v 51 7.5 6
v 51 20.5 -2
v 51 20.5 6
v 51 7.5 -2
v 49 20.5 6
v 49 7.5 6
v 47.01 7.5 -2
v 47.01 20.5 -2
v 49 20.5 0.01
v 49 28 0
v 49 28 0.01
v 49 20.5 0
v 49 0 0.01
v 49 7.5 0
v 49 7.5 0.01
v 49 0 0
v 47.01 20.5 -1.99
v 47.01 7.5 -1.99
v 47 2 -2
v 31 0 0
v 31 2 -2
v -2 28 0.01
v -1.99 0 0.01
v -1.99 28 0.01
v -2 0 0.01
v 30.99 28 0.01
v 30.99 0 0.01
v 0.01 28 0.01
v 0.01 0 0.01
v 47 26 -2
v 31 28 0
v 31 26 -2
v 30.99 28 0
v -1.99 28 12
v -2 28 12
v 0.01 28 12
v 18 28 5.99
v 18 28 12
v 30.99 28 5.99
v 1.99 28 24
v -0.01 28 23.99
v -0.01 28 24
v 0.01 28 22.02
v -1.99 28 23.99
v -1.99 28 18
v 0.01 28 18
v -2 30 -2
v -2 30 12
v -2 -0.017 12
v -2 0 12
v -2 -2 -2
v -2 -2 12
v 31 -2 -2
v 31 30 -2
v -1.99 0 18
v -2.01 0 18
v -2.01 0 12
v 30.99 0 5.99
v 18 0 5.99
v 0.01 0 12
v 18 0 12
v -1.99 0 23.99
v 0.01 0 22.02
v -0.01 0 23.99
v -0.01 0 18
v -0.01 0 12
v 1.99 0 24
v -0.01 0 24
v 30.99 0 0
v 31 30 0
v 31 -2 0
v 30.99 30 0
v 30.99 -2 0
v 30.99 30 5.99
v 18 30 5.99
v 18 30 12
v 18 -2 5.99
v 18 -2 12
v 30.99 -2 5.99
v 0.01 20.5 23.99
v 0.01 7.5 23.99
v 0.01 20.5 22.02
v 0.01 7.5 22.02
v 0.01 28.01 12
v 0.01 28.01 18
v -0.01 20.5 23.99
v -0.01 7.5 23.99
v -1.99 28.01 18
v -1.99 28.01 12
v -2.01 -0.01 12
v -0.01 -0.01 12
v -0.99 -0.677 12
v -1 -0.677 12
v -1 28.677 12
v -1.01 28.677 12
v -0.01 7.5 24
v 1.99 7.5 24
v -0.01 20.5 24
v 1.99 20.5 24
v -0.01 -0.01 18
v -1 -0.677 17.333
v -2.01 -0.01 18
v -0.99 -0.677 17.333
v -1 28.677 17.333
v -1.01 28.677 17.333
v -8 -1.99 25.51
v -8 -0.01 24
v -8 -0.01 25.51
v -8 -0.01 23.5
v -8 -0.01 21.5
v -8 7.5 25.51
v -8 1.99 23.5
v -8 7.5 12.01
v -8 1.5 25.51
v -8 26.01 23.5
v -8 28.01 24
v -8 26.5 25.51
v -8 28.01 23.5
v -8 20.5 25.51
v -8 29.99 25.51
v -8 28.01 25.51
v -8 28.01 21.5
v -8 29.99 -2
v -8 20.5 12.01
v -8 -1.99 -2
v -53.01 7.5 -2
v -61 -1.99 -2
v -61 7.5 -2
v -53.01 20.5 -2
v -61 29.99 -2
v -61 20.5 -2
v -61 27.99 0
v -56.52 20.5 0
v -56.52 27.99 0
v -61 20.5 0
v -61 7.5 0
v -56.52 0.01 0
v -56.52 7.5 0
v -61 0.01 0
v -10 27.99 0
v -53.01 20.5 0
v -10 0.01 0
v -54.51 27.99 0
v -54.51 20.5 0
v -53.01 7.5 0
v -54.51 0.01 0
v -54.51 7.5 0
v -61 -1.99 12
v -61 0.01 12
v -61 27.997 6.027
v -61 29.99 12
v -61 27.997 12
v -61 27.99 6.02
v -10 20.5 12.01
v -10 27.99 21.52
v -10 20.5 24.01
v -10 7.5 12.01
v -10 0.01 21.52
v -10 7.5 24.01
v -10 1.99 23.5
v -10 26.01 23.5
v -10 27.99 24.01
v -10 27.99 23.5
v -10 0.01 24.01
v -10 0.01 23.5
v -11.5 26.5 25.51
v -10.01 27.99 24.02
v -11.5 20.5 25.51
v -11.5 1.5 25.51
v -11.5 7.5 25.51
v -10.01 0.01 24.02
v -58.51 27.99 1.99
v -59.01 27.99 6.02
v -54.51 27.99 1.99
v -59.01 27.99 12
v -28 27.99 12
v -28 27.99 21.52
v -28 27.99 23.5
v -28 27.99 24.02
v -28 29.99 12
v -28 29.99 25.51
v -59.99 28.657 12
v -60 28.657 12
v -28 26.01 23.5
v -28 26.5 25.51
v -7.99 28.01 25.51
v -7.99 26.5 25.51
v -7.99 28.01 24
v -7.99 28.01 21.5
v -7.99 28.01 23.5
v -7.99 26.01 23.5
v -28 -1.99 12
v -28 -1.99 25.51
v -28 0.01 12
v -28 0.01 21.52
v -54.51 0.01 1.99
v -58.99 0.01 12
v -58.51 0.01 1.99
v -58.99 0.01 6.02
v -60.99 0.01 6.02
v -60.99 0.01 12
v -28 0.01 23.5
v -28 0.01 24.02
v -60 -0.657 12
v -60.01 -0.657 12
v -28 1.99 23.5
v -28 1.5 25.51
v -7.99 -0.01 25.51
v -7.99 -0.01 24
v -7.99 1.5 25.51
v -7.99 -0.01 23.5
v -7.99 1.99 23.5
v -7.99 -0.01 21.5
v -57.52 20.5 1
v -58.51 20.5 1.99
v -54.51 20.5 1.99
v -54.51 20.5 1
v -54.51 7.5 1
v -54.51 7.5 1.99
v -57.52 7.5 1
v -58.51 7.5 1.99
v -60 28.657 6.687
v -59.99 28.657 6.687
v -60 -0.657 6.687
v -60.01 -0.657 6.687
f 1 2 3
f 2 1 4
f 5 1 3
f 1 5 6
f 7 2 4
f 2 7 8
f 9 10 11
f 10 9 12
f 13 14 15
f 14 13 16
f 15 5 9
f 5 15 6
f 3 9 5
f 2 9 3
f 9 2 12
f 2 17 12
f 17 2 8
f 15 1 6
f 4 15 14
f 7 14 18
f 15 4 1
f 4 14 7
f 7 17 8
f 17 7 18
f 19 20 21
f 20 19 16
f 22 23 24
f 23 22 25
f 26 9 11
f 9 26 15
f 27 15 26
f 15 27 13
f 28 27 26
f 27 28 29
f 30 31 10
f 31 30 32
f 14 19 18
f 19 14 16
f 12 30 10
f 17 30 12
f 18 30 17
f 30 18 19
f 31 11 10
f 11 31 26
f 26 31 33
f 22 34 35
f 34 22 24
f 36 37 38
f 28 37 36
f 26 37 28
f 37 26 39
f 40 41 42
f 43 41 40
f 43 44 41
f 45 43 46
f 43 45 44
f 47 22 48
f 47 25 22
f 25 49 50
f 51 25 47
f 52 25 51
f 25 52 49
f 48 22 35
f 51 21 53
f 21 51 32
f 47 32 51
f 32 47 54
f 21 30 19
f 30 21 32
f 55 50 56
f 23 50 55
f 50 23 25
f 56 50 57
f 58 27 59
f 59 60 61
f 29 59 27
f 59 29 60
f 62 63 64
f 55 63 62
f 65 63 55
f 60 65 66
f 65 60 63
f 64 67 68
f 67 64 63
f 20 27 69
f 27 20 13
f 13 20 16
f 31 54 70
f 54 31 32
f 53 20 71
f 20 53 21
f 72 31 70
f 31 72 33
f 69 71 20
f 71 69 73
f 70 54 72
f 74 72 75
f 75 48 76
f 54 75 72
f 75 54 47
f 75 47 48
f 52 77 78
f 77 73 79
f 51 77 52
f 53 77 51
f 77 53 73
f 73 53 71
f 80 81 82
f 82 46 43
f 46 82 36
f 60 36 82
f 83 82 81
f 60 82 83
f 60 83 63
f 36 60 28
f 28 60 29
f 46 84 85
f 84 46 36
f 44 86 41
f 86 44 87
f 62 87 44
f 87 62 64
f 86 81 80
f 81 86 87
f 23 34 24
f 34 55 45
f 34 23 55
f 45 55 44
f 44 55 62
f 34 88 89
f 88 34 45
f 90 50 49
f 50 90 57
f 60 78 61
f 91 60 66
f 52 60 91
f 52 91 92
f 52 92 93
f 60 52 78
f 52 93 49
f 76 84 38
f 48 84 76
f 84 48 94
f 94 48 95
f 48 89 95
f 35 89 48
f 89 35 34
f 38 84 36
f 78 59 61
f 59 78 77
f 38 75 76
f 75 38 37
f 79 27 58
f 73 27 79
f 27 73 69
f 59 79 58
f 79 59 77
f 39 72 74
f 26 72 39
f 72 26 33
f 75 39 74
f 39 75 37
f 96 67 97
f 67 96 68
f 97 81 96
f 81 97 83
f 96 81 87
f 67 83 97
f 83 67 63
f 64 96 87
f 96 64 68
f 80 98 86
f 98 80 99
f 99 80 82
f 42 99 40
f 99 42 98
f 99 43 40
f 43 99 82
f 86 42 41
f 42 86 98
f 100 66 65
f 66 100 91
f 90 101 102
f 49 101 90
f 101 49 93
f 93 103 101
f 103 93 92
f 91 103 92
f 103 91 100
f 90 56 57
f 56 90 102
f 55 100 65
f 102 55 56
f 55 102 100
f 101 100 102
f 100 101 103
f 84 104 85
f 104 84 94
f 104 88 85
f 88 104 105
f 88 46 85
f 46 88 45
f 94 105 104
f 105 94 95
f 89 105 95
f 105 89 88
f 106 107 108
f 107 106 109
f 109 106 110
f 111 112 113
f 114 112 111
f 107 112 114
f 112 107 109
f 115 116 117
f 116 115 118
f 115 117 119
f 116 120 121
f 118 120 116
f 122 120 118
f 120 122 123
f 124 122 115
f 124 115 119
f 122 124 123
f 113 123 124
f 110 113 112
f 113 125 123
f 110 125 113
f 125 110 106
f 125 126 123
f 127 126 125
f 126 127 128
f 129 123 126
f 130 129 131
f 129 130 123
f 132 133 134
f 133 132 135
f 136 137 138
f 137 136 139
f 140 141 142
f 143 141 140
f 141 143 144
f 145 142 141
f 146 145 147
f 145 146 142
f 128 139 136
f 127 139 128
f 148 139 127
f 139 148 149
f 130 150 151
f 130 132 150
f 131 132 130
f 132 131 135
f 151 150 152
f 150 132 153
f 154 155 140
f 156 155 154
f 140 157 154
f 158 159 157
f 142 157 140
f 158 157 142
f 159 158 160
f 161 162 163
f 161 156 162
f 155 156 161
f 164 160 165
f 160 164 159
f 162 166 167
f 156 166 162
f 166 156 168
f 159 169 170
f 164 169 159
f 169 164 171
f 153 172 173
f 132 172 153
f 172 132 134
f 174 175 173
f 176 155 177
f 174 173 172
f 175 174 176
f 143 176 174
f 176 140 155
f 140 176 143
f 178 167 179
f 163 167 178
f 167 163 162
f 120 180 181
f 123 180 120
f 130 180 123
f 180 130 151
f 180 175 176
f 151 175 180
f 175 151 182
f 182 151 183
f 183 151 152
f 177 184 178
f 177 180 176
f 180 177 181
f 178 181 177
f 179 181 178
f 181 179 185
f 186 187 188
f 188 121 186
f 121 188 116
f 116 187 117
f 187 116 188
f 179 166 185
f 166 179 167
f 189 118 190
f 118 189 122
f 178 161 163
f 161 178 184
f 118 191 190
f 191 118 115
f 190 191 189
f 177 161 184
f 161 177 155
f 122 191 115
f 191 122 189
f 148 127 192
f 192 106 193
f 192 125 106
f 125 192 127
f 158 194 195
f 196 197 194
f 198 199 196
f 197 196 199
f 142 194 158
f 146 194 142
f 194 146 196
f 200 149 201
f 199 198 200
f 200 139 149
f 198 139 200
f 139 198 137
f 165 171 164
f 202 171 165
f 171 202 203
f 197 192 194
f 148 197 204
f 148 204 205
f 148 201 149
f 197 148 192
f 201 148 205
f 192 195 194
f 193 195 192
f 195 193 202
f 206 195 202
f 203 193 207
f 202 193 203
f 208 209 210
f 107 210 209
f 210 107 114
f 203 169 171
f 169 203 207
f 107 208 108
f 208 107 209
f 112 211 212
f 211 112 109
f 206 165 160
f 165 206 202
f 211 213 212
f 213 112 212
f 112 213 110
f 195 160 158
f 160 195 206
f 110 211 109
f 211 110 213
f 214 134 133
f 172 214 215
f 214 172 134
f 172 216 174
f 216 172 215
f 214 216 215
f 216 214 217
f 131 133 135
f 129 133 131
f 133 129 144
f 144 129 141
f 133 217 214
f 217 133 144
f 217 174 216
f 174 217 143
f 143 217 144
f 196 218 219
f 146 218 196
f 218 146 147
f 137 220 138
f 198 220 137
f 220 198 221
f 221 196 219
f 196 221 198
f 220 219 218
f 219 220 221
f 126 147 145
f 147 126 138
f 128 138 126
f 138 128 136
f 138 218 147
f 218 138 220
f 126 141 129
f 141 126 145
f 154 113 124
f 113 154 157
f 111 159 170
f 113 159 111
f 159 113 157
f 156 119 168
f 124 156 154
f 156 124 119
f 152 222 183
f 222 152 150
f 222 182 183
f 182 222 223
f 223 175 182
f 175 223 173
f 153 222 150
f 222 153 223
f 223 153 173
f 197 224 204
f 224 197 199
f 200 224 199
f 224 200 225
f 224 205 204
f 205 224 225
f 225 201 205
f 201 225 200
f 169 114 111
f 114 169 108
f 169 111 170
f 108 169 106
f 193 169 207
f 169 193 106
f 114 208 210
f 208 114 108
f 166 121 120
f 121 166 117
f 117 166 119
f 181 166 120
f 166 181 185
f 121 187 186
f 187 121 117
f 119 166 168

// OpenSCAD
/* [Sizes] */
// size X
x=49;
// size Y
y=28;
// size Z
z=24;
// plus wall
w=2.0;//[1:0.2:5]

/* [Holes] */
// left
h1=true;
// right
h2=true;
// front
h3=true;
// top
h4=true;

// hole width
cw=13;
// top hole width
ch=6;
// upper edge
chh=12;
// lower edge
chl=6;
// side offset
cso=0;
// additional right side hole width
cswr=0;

/* [Hidden] */
_d1=0.01;
_d2=0.02;
_d3=0.03;

module indent(c) {
    hull() {
        translate([w/2,0,w/3]) cube([_d1,c-w/3,_d1]);
        translate([-_d1,0,0]) cube([w,c,_d1]);
    }
}

module bottom() {
   hull() {
        translate([-w,0,0]) cube([x+w,y,_d1]);
        translate([-w,w,-w]) cube([x,y-2*w,_d1]);
    }
    translate([-w,-w,-w]) cube([x/2+cw/2+w+cso,y+2*w,w]);
    translate([_d1-w,0,-_d1]) cube([w,y,z]);
    translate([_d1-w,-w,-w]) cube([w,y+2*w,w+chh]);
    #translate([-w,-w,-w]) cube([x/2-cw/2+w+cso-cswr,w,w+chh]);
    translate([-w,y,-w]) cube([x/2-cw/2+w+cso,w,w+chh]);
    // lowers
    if(h3) {
        translate([x,y/2-cw/2,-w]) cube([w,cw,chl+w]);
        translate([x-w+_d1,y/2-cw/2,-w]) cube([w+_d2,cw,w]);
    }
    translate([x/2-cw/2-_d1+cso-cswr,-w,-_d1]) cube([cw+cswr,w,h2?chl:chh]);
    translate([x/2-cw/2-_d1+cso,y,-_d1]) cube([cw,w,h1?chl:chh]);
    // align sliders on top
    translate([-_d1,0,z]) rotate([-90,0,0]) linear_extrude(y/2-cw/2) polygon([[0,0],[0,w],[w,0]]);
    translate([-_d1,y/2+cw/2,z]) rotate([-90,0,0]) linear_extrude(y/2-cw/2) polygon([[0,0],[0,w],[w,0]]);
    // indents on side
    translate([-w,0,chh]) rotate([90,0,0]) indent((z-chh)/2);
    translate([0,y,chh]) rotate([90,0,180]) indent((z-chh)/2);

}
module side_top() {
    rotate([90,0,0]) linear_extrude(w) polygon([
        // top and right sides
        [-w,z+w], [x+w,z+w], [x+w,-w],
        // hole
        [x/2+cw/2+cso,-w], [x/2+cw/2+cso,chh], [-w,chh],
    ]);
}
module _top() {
    // top
    translate([-w,0,z]) cube([x+2*w,y,w]);
    // front
    translate([x,0,-w]) cube([w,y,z+2*w]);
    translate([x-w+_d1,0,0]) rotate([-90,0,0]) linear_extrude(y) polygon([[w,w],[0,w],[w,0]]);
    // left
    //translate([-w,_d1-w,-w]) cube([x+2*w,w,z+2*w]);
    translate([0,_d1,0]) side_top();
    translate([x/2+cw/2+cso,-_d1,-w]) rotate([0,90,0]) linear_extrude(x/2-cw/2-cso+w+_d1) polygon([[0,0],[0,w],[-w,0]]);
    translate([x/2+cw/2+cso,-_d1,w/4]) rotate([0,90,0]) linear_extrude(x/2-cw/2+w-cso+_d1) polygon([[0,0],[0,w],[-w,0]]);
    // right
    translate([0,y+w-_d1,0]) side_top();
    translate([x/2+cw/2+cso,y+_d1,-w]) rotate([0,90,0]) linear_extrude(x/2-cw/2-cso+w+_d1) polygon([[0,0],[0,-w],[-w,0]]);
    translate([x/2+cw/2+cso,y+_d1,w/4]) rotate([0,90,0]) linear_extrude(x/2-cw/2-cso+w+_d1) polygon([[0,0],[0,-w],[-w,0]]);
    // guides at top
    translate([-_d1+w/4,0,z+_d1]) rotate([-90,0,0]) linear_extrude(y/2-cw/2) polygon([[2*w,0],[2*w,w],[0,w],[w,0]]);
    translate([-_d1+w/4,y/2+cw/2,z+_d1]) rotate([-90,0,0]) linear_extrude(y/2-cw/2) polygon([[2*w,0],[2*w,w],[0,w],[w,0]]);
}
module top() {
    difference() {
        _top();
        // cable on top
        if(h4) translate([-w-_d1,y/2-cw/2,z-w/2]) cube([ch+w,cw,2*w]);
        // cable on front
        if(h3) translate([x-1.5*w,y/2-cw/2,-w-_d1]) cube([3*w,cw,chh+w]);
        // indents on side
        translate([-w,_d2,chh-_d2]) rotate([90,0,0]) indent((z-chh)/2);
        translate([0,y-_d2,chh-_d2]) rotate([90,0,180]) indent((z-chh)/2);
        // cut odd top and bottom a bit
        translate([-w-_d1,-w-_d1,-w-_d1]) cube([x+2*w+_d3,y+2*w+_d3,w/4]);
    }
}

//difference() { union() {
bottom();
if($preview) color([0,1,0,.3]) top();
translate([-x-5*w,y,z]) rotate([180,0,0]) top();
//}translate([-8*w-x,-2*w,-2*w]) cube([2*x+10*w,y/2+2*w,z+4*w]);}
